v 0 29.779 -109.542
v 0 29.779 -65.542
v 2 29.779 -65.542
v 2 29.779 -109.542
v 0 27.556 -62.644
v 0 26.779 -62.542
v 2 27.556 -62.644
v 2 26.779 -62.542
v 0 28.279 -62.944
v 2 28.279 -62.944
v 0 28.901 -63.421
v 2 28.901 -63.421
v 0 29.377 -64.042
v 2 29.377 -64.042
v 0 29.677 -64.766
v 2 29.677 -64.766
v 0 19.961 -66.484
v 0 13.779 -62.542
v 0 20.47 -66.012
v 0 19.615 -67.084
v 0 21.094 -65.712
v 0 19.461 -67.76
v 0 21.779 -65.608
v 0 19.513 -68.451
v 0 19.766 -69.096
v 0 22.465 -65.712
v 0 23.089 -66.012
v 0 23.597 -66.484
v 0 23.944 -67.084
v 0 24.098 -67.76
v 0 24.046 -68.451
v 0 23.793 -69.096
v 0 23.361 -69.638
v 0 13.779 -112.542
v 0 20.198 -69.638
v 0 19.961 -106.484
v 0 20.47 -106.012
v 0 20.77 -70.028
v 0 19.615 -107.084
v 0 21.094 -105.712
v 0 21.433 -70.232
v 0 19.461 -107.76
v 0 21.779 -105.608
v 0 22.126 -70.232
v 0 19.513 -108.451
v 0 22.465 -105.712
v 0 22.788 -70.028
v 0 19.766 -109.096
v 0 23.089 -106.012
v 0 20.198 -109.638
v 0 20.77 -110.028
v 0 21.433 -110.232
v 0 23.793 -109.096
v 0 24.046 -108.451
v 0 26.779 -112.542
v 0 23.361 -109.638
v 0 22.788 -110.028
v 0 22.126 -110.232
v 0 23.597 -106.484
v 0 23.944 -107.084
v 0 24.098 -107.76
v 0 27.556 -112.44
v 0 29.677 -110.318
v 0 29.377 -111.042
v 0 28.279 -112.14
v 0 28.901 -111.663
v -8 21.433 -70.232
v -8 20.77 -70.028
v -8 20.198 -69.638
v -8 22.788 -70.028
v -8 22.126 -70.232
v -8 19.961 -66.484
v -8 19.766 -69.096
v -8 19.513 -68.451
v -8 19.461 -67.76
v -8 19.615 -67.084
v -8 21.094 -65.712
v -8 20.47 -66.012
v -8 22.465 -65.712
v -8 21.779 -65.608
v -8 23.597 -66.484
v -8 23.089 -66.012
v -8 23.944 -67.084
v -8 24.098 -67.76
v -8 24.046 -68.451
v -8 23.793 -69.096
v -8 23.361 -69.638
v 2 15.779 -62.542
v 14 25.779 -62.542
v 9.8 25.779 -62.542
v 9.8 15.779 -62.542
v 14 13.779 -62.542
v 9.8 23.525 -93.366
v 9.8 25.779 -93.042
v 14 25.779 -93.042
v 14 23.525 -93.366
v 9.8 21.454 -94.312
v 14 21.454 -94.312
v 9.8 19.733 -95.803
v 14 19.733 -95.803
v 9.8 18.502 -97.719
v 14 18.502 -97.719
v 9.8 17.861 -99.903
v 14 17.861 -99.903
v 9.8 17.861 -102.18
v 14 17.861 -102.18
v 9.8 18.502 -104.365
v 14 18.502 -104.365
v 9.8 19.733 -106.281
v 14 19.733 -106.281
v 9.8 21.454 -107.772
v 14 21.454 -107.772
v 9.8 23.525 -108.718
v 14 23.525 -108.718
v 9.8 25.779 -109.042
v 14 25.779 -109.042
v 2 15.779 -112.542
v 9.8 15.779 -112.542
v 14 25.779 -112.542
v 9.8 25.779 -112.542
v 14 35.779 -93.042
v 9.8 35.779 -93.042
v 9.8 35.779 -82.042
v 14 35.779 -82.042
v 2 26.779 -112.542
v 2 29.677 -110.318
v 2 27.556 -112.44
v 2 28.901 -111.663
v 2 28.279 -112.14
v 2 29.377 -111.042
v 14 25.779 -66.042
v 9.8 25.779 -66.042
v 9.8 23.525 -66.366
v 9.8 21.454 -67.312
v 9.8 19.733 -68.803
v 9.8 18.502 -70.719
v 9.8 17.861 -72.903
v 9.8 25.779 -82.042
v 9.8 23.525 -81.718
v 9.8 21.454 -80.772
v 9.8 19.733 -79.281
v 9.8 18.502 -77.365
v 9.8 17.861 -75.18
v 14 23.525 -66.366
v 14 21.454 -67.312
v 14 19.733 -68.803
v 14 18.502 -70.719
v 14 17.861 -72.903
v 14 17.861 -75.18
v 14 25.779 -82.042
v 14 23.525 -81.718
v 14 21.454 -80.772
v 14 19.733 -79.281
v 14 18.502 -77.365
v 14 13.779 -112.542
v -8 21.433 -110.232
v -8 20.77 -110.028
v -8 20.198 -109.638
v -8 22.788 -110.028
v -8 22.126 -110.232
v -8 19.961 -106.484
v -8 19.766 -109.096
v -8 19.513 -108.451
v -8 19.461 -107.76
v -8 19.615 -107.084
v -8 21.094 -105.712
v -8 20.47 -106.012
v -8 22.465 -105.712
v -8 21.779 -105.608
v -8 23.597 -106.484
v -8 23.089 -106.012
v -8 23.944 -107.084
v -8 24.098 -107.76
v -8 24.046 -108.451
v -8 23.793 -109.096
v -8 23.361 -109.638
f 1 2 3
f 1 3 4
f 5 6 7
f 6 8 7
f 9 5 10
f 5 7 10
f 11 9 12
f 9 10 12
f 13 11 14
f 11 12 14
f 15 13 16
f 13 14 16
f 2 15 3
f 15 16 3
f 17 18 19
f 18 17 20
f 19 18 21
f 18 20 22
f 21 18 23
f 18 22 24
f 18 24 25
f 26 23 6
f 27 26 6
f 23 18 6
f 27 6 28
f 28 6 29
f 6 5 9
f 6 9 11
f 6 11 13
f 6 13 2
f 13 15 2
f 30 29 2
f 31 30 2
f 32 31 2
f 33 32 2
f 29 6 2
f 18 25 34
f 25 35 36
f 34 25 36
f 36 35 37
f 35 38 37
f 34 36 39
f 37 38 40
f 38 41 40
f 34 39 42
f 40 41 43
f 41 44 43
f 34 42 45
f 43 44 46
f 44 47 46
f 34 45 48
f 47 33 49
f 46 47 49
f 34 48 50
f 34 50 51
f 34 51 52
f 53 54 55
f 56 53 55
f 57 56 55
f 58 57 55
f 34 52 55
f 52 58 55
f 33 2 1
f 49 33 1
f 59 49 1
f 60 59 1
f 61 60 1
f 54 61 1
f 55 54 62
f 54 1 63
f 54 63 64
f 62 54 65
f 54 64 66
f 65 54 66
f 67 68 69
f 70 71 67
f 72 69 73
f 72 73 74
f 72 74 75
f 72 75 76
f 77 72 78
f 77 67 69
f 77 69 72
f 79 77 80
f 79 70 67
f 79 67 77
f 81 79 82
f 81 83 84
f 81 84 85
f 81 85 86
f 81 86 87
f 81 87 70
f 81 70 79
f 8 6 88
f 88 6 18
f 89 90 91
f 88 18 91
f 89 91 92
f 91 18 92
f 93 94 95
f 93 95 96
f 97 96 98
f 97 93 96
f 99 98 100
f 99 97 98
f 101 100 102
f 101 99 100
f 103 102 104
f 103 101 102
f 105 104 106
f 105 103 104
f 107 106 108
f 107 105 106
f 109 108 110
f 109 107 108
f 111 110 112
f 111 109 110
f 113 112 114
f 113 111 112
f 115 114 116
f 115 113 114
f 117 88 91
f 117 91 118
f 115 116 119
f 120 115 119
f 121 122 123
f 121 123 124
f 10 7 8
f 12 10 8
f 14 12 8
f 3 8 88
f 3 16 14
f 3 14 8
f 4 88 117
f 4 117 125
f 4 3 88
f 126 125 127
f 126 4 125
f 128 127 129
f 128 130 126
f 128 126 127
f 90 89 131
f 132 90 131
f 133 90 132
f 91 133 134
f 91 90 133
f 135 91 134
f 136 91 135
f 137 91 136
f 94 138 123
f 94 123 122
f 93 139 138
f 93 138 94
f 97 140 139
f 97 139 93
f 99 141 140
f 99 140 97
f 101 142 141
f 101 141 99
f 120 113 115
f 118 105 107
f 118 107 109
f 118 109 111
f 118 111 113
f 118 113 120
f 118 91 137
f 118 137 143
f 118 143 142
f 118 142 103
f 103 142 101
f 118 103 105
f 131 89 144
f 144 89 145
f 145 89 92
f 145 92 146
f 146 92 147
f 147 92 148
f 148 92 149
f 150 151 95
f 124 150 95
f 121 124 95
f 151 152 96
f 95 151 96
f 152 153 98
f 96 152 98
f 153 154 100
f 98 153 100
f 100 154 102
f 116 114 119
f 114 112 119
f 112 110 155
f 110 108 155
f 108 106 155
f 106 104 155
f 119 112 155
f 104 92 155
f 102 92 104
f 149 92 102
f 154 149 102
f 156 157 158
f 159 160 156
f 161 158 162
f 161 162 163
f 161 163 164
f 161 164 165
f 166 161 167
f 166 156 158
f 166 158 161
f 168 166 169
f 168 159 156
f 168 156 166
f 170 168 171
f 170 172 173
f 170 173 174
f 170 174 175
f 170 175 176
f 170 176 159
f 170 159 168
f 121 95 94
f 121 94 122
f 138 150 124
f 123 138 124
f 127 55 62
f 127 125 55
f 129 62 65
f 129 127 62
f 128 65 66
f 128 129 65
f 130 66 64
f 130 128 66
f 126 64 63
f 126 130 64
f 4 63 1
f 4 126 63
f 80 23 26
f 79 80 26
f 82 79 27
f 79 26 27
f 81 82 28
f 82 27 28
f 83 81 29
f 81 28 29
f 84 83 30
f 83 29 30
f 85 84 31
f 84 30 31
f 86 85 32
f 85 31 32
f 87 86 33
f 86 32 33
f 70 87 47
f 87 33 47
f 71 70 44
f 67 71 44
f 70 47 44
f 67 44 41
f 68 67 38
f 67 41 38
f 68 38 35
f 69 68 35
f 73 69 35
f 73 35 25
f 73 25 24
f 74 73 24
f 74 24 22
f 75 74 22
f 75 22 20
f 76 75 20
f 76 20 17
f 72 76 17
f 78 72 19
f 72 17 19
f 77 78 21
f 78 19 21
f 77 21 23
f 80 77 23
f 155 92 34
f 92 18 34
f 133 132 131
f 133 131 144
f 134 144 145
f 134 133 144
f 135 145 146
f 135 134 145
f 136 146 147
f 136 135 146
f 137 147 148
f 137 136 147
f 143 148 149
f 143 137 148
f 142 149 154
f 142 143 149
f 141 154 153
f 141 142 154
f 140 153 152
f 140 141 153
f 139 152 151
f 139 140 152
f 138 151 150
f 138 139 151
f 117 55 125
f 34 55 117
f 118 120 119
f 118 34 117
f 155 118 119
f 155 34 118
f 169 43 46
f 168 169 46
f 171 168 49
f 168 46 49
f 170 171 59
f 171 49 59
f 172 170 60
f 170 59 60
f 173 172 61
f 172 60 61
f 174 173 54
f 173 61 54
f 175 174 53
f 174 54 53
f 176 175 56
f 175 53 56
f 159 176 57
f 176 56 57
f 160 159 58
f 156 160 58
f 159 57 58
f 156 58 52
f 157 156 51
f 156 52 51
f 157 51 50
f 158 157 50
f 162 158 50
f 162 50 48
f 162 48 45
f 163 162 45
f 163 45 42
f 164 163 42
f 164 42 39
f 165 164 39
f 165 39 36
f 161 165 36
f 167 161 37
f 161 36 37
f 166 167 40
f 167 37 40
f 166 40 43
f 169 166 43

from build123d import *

# Parameters (mm, degrees)
SKETCH1_W               = 50
SKETCH1_H               = 16
BOSS_EXTRUDE1_DEPTH     = 2
SKETCH2_R               = 2.325
BOSS_EXTRUDE2_DEPTH     = 8
SKETCH3_W               = 50
SKETCH3_H               = 2
BOSS_EXTRUDE3_DEPTH     = 12
SKETCH4_W               = 4.2
SKETCH4_H               = 50
BOSS_EXTRUDE4_DEPTH     = 20
CUT_EXTRUDE1_DEPTH      = 121.124312029
CUT_EXTRUDE1_DEPTH_BACK = 4.2
SKETCH7_R               = 8
SKETCH8_W               = 16
SKETCH8_H               = 10
CUT_EXTRUDE2_DEPTH      = 4.2
FILLET1_R               = 3
SKETCH9_W               = 3.5
SKETCH9_H               = 10
CUT_EXTRUDE4_DEPTH      = 10


with BuildPart() as part:
    # Sketch1 → Boss-Extrude1 (new body)
    with BuildSketch(Plane(origin=(0, 0, 0), x_dir=(0, 0, -1), z_dir=(1, 0, 0))):
        with Locations((87.541975563, 21.779240865)):
            Rectangle(SKETCH1_W, SKETCH1_H)
    extrude(amount=BOSS_EXTRUDE1_DEPTH)

    # Sketch2 → Boss-Extrude2 (add)
    with BuildSketch(Plane.ZY):
        with Locations((-107.933354654, 21.779240865)):
            Circle(SKETCH2_R)
        with Locations((-67.933354654, 21.779240865)):
            Circle(SKETCH2_R)
    extrude(amount=BOSS_EXTRUDE2_DEPTH)

    # Sketch3 → Boss-Extrude3 (add)
    with BuildSketch(Plane(origin=(2, 0, 0), x_dir=(0, 0, -1), z_dir=(1, 0, 0))):
        with Locations((87.541975563, 14.779240865)):
            Rectangle(SKETCH3_W, SKETCH3_H)
    extrude(amount=BOSS_EXTRUDE3_DEPTH)

    # Sketch4 → Boss-Extrude4 (add)
    with BuildSketch(Plane(origin=(0, 15.779240865, 0), x_dir=(1, 0, 0), z_dir=(0, 1, 0))):
        with Locations((11.9, 87.541975563)):
            Rectangle(SKETCH4_W, SKETCH4_H)
    extrude(amount=BOSS_EXTRUDE4_DEPTH)

    # Sketch7 → Cut-Extrude1 (cut, two sides: drawn at the far end of the back side and taken through both)
    with BuildSketch(Plane(origin=(14, 0, 0), x_dir=(0, 0, -1), z_dir=(1, 0, 0)).offset(-CUT_EXTRUDE1_DEPTH_BACK)):
        with Locations(Location((74.041975563, 25.779240865, 0), (0, 0, 180))):
            Circle(SKETCH7_R)
        with Locations(Location((101.041975563, 25.779240865, 0), (0, 0, 180))):
            Circle(SKETCH7_R)
    extrude(amount=CUT_EXTRUDE1_DEPTH + CUT_EXTRUDE1_DEPTH_BACK, mode=Mode.SUBTRACT)

    # Sketch8 → Cut-Extrude2 (cut)
    with BuildSketch(Plane(origin=(14, 0, 0), x_dir=(0, 0, -1), z_dir=(1, 0, 0))):
        with Locations((74.041975563, 30.779240865)):
            Rectangle(SKETCH8_W, SKETCH8_H)
        with Locations((101.041975563, 30.779240865)):
            Rectangle(SKETCH8_W, SKETCH8_H)
    extrude(amount=-CUT_EXTRUDE2_DEPTH, mode=Mode.SUBTRACT)

    # Fillet1
    fillet1_edges = [part.edges().sort_by_distance(p)[0] for p in [
        (1, 29.779240865, -62.541975563),
        (1, 29.779240865, -112.541975563),
    ]]
    fillet(fillet1_edges, radius=FILLET1_R)

    # Sketch9 → Cut-Extrude4 (cut)
    with BuildSketch(Plane(origin=(14, 0, 0), x_dir=(0, 0, -1), z_dir=(1, 0, 0))):
        with Locations((64.291975563, 30.779240865)):
            Rectangle(SKETCH9_W, SKETCH9_H)
        with Locations((110.791975563, 30.779240865)):
            Rectangle(SKETCH9_W, SKETCH9_H)
    extrude(amount=-CUT_EXTRUDE4_DEPTH, mode=Mode.SUBTRACT)


solid = part.part
